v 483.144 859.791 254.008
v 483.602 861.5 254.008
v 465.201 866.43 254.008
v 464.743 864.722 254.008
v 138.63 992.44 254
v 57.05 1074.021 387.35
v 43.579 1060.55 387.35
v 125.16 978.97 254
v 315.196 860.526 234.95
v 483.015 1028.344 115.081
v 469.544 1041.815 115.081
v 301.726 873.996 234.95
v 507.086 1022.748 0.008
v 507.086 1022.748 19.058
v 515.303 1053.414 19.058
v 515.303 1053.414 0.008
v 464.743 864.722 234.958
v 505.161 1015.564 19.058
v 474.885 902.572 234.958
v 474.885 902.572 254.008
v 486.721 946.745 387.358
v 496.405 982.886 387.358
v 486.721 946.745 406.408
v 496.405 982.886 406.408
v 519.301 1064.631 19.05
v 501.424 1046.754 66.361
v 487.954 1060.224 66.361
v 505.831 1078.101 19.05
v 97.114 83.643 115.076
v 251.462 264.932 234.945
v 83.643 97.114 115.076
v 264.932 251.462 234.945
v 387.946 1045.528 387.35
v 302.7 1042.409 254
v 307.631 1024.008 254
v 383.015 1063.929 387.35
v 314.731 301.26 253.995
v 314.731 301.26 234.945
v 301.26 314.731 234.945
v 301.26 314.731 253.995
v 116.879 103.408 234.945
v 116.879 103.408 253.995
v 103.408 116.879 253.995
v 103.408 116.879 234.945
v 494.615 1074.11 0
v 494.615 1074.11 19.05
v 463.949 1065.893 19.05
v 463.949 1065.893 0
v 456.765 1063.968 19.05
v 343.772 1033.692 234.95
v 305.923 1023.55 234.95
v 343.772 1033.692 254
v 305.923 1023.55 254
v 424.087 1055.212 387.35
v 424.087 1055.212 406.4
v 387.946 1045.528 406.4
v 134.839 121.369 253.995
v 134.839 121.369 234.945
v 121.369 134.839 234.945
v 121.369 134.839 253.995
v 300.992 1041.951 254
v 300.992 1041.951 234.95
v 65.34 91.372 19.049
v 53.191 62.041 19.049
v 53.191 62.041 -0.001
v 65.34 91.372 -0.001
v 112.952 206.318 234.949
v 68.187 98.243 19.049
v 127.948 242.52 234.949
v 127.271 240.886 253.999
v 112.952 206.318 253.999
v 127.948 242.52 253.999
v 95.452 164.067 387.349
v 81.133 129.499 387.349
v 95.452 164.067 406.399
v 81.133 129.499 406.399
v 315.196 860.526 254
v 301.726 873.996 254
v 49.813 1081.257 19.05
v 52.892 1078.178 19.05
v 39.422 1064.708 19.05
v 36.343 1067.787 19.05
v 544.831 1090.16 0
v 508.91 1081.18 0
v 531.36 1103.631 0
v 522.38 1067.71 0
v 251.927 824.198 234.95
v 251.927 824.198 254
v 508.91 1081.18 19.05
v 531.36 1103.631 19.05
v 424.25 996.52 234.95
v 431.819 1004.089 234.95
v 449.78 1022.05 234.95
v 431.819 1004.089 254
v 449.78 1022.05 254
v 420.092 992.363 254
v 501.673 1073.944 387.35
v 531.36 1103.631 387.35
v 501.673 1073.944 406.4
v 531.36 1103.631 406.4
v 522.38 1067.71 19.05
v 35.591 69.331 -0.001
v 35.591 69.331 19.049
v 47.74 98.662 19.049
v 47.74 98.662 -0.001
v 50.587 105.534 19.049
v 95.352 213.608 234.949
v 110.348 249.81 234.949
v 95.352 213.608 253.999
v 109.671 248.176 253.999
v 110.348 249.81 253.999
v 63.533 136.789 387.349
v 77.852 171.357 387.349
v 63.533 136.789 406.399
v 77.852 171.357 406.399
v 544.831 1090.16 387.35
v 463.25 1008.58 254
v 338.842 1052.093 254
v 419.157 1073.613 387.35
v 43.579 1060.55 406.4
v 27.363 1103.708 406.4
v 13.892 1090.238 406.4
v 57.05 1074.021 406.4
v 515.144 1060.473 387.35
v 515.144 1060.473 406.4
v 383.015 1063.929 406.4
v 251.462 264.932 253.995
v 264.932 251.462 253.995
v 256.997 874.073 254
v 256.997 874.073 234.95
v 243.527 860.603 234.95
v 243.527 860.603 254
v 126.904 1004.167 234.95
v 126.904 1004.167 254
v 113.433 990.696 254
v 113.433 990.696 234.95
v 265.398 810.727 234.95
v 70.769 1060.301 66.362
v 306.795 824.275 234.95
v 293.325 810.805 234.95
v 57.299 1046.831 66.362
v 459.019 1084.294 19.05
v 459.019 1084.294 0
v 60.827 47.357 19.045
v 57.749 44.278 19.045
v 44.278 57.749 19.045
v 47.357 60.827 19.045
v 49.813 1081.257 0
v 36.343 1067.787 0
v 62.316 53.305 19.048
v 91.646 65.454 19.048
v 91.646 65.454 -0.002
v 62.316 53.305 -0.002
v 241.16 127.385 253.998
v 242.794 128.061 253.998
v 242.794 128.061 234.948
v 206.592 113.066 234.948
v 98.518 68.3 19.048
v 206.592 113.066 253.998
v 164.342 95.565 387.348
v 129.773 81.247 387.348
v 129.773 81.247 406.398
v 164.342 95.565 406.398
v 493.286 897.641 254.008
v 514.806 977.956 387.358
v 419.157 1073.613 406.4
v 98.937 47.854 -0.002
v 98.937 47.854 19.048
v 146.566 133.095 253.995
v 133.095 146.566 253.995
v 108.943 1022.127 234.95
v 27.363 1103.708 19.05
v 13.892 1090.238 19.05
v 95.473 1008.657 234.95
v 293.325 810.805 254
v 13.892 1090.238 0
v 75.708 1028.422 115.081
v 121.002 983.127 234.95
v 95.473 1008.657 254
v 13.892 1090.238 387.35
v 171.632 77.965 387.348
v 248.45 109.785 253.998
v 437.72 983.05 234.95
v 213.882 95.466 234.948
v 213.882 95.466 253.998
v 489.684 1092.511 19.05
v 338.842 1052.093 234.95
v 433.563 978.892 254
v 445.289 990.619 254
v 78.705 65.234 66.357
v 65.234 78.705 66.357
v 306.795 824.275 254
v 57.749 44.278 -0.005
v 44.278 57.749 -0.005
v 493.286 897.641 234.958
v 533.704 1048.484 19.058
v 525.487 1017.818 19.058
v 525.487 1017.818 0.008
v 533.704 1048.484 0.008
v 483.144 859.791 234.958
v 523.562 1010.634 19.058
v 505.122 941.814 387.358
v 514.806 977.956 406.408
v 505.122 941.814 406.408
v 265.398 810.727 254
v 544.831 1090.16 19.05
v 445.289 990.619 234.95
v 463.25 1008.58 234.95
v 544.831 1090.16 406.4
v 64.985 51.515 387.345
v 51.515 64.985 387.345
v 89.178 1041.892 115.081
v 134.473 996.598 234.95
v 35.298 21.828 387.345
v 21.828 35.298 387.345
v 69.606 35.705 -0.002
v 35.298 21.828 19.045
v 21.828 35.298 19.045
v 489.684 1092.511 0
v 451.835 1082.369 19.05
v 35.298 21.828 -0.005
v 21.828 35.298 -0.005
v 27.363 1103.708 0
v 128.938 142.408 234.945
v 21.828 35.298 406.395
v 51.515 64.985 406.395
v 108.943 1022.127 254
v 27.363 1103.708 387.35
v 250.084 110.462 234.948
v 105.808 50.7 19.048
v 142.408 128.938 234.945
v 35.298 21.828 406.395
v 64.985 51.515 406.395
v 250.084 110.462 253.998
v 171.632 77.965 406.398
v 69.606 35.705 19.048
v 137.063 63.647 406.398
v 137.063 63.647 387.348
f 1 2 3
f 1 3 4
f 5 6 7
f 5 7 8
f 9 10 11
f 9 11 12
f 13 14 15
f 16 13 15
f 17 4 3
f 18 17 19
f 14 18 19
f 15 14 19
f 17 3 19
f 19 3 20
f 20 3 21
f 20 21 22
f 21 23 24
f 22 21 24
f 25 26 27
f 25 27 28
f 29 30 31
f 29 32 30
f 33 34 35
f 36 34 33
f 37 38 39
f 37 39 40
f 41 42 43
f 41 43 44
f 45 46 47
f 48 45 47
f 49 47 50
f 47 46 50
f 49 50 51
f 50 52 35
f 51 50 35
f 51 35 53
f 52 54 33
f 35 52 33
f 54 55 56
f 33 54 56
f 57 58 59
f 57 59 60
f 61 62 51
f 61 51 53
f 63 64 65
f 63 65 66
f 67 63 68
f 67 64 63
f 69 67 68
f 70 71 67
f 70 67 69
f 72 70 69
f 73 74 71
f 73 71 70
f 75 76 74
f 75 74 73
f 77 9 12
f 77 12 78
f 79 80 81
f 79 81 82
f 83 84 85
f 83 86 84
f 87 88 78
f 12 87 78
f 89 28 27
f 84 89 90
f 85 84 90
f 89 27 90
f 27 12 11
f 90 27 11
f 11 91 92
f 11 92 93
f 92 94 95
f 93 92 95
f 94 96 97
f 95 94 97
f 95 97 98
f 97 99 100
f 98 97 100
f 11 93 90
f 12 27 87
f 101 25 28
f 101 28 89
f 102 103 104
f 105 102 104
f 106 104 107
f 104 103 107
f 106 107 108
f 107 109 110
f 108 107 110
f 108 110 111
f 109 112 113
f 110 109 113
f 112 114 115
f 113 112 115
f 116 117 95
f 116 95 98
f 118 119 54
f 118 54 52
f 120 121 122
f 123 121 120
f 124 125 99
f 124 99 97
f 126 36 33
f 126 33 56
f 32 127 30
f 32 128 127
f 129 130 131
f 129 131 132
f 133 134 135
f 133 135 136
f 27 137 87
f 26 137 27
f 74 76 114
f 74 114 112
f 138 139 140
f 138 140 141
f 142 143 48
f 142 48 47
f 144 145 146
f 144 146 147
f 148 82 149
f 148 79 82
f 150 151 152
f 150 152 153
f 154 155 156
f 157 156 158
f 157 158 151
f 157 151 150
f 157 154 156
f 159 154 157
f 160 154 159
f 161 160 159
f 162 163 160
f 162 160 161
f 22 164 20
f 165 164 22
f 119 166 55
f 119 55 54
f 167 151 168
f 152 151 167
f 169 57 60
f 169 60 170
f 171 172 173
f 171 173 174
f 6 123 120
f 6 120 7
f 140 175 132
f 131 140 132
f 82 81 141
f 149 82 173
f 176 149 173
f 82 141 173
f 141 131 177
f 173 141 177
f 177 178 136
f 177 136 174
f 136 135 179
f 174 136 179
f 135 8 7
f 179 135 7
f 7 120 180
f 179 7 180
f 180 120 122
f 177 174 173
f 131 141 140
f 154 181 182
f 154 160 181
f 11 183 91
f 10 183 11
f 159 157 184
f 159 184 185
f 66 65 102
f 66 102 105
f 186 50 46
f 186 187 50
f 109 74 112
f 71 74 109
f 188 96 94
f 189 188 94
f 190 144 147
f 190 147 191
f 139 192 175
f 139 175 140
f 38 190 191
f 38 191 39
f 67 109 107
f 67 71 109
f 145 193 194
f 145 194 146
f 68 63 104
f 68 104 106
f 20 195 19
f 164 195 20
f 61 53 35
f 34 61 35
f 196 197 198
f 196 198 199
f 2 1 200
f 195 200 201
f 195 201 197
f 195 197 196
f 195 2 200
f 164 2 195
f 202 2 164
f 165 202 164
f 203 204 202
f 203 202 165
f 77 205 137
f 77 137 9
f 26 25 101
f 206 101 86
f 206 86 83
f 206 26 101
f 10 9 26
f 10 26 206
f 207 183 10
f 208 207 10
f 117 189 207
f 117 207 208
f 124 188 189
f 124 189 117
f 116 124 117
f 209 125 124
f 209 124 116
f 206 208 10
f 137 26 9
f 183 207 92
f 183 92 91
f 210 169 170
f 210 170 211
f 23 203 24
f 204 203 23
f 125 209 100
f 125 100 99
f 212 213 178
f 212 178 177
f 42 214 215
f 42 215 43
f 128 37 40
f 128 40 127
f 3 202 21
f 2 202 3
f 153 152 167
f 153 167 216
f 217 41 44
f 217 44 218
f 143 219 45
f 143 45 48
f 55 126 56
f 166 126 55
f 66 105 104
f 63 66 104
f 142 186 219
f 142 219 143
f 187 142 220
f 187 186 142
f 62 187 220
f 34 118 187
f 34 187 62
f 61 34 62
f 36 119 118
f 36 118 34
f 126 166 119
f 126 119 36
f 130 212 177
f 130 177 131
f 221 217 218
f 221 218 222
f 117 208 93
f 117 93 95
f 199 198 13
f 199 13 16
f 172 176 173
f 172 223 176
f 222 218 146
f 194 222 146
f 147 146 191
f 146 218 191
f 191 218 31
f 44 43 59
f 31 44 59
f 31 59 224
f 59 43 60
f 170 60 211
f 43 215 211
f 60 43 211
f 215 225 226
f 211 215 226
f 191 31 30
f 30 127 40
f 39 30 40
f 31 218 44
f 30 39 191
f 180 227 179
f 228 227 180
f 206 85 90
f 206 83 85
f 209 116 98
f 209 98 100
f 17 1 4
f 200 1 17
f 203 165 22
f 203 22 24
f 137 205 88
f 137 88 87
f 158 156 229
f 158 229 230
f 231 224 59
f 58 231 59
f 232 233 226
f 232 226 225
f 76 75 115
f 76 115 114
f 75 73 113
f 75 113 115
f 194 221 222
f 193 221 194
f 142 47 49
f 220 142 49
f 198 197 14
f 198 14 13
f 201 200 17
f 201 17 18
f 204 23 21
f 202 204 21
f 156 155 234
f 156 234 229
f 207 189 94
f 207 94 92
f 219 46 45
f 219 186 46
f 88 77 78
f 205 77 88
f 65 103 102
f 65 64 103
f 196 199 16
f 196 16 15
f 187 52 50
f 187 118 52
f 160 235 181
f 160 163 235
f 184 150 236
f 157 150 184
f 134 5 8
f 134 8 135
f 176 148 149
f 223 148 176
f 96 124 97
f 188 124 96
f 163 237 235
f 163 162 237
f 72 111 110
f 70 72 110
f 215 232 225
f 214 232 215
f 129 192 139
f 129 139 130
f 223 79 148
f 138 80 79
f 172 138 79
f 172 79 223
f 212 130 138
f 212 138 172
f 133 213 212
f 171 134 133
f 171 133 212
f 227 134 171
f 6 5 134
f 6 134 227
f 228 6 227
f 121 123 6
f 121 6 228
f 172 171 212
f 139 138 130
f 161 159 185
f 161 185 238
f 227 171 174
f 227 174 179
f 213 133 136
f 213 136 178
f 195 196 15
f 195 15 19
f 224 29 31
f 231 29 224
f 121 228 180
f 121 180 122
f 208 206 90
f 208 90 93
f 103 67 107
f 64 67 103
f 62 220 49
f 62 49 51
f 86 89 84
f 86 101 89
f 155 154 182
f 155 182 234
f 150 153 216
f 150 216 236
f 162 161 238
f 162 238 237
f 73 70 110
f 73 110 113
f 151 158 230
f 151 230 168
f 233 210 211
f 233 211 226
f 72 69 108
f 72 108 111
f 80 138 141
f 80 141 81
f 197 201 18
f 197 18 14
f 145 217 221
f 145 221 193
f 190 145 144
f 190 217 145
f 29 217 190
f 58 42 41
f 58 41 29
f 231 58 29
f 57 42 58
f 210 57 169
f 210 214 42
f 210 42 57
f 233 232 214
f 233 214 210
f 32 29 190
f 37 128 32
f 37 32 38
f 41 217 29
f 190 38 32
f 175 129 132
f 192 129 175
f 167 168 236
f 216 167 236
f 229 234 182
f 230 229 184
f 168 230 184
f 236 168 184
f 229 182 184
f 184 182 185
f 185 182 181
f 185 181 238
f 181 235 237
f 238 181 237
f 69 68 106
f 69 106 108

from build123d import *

# Parameters (mm, degrees)
F6_DEPTH  = 9.525
F7_DEPTH  = 9.525
F10_DEPTH = 9.525
F13_DEPTH = 9.525
F15_DEPTH = 9.525
F18_DEPTH = 9.525
F21_DEPTH = 9.525


with BuildPart() as f6:
    # F3 (on face) → F6 (new body, symmetric)
    with BuildSketch(Plane(origin=(-279.3999947591, 279.3999947591, 0), x_dir=(0.7071067812, 0.7071067812, 0), z_dir=(0.7071067812, -0.7071067812, 0))):
        Polygon((1156.1131477356, 0), (1156.1131477356, 19.05), (1040.740609169, 234.95), (1040.740609169, 254), (1156.1131477356, 387.35), (1156.1131477356, 406.4), (1114.1292903237, 406.4), (1114.1292903237, 387.35), (998.7567517572, 254), (1015.340609169, 254), (1015.340609169, 234.95), (1004.6365004879, 234.95), (1068.6922232809, 115.0806556757), (831.3609417396, 234.95), (831.3609417396, 254), (760.9355412407, 254), (760.9355412407, 234.95), (1094.7267659742, 66.3614557923), (1120.0090390545, 19.05), (1124.3631477356, 19.05), (1124.3631477356, 0), align=None)
    extrude(amount=F6_DEPTH, both=True)


with BuildPart() as f7:
    # F5 (on line) → F7 (new body, symmetric)
    with BuildSketch(Plane(origin=(-237.8599100338, 887.7052693302, 0), x_dir=(-0.9659258263, -0.2588190451, 0), z_dir=(-0.2588190451, 0.9659258263, 0))):
        Polygon((-755.7615637779, 19.05), (-755.7615637779, 0), (-724.014043808, 0), (-724.014043808, 19.05), (-716.5765570262, 19.05), (-560.4129241565, 234.95), (-560.4129241565, 254), (-562.1815213486, 254), (-645.3293451592, 387.35), (-645.3293451592, 406.4), (-682.7457547188, 406.4), (-682.7457547188, 387.35), (-599.5979309082, 254), (-599.5979309082, 234.95), align=None)
    extrude(amount=F7_DEPTH, both=True)


with BuildPart() as f10:
    # F9 (on line) → F10 (new body, symmetric)
    with BuildSketch(Plane(origin=(226.6314452412, -60.7257127319, 0), x_dir=(0.2588190451, 0.9659258263, 0), z_dir=(0.9659258263, -0.2588190451, 0))):
        Polygon((1040.4578773385, 387.3577304348), (957.3100535279, 254.0077304348), (955.5414563358, 254.0077304348), (955.5414563358, 234.9577304348), (1111.7050892055, 19.0577304348), (1119.1425759873, 19.0577304348), (1119.1425759873, 0.0077304348), (1150.8900959572, 0.0077304348), (1150.8900959572, 19.0577304348), (994.7264630875, 234.9577304348), (994.7264630875, 254.0077304348), (1077.8742868981, 387.3577304348), (1077.8742868981, 406.4077304348), (1040.4578773385, 406.4077304348), align=None)
    extrude(amount=F10_DEPTH, both=True)


with BuildPart() as f13:
    # F12 (on face) → F13 (new body, symmetric)
    with BuildSketch(Plane(origin=(558.8000271954, 558.8000271954, 0), x_dir=(-0.7071067812, 0.7071067812, 0), z_dir=(0.7071067812, 0.7071067812, 0))):
        Polygon((761.091153445, 0.0001614707), (761.091153445, 19.0501614707), (645.7186148784, 234.9501614707), (645.7186148784, 254.0001614707), (761.091153445, 387.3501614707), (761.091153445, 406.4001614707), (719.1072960331, 406.4001614707), (719.1072960331, 387.3501614707), (603.7347574665, 254.0001614707), (620.3186148784, 254.0001614707), (620.3186148784, 234.9501614707), (609.6145061973, 234.9501614707), (673.6702289903, 115.0808171464), (436.338947449, 234.9501614707), (436.338947449, 254.0001614707), (365.9135469501, 254.0001614707), (365.9135469501, 234.9501614707), (699.7047716836, 66.3616172629), (724.9870447639, 19.0501614707), (729.341153445, 19.0501614707), (729.341153445, 0.0001614707), align=None)
    extrude(amount=F13_DEPTH, both=True)


with BuildPart() as f15:
    # F14 (on face) → F15 (new body, symmetric)
    with BuildSketch(Plane(origin=(5.2409e-06, -5.2409e-06, 0), x_dir=(0.7071067812, 0.7071067812, 0), z_dir=(0.7071067812, -0.7071067812, 0))):
        Polygon((127.8147583451, 115.0757371464), (191.8704811381, 234.9450814707), (181.166372457, 234.9450814707), (181.166372457, 253.9950814707), (197.7502298688, 253.9950814707), (82.3776913023, 387.3450814707), (82.3776913023, 406.3950814707), (40.3938338904, 406.3950814707), (40.3938338904, 387.3450814707), (155.766372457, 253.9950814707), (155.766372457, 234.9450814707), (40.3938338904, 19.0450814707), (40.3938338904, -0.0049185293), (72.1438338904, -0.0049185293), (72.1438338904, 19.0450814707), (76.4979425715, 19.0450814707), (101.7802156518, 66.3565372629), (435.5714403853, 234.9450814707), (435.5714403853, 253.9950814707), (365.1460398864, 253.9950814707), (365.1460398864, 234.9450814707), align=None)
    extrude(amount=F15_DEPTH, both=True)


with BuildPart() as f18:
    # F17 (on line) → F18 (new body, symmetric)
    with BuildSketch(Plane(origin=(-6.0751025032, 14.6665948559, 0), x_dir=(-0.9238795325, -0.3826834324, 0), z_dir=(-0.3826834324, 0.9238795325, 0))):
        Polygon((-188.4031181607, 387.3475704348), (-271.5509419713, 253.9975704348), (-273.3195391634, 253.9975704348), (-273.3195391634, 234.9475704348), (-117.1559062937, 19.0475704348), (-109.7184195119, 19.0475704348), (-109.7184195119, -0.0024295652), (-77.970899542, -0.0024295652), (-77.970899542, 19.0475704348), (-234.1345324117, 234.9475704348), (-234.1345324117, 253.9975704348), (-150.9867086011, 387.3475704348), (-150.9867086011, 406.3975704348), (-188.4031181607, 406.3975704348), align=None)
    extrude(amount=F18_DEPTH, both=True)


with BuildPart() as f21:
    # F20 (on line) → F21 (new body, symmetric)
    with BuildSketch(Plane(origin=(14.6666075026, -6.0751077416, 0), x_dir=(0.3826834324, 0.9238795325, 0), z_dir=(0.9238795325, -0.3826834324, 0))):
        Polygon((77.6739885453, 19.04949), (77.6739885453, -0.00051), (109.4215085152, -0.00051), (109.4215085152, 19.04949), (116.858995297, 19.04949), (273.0226281667, 234.94949), (273.0226281667, 253.99949), (271.2540309746, 253.99949), (188.106207164, 387.34949), (188.106207164, 406.39949), (150.6897976044, 406.39949), (150.6897976044, 387.34949), (233.837621415, 253.99949), (233.837621415, 234.94949), align=None)
    extrude(amount=F21_DEPTH, both=True)


solid = Compound([f6.part, f7.part, f10.part, f13.part, f15.part, f18.part, f21.part])
